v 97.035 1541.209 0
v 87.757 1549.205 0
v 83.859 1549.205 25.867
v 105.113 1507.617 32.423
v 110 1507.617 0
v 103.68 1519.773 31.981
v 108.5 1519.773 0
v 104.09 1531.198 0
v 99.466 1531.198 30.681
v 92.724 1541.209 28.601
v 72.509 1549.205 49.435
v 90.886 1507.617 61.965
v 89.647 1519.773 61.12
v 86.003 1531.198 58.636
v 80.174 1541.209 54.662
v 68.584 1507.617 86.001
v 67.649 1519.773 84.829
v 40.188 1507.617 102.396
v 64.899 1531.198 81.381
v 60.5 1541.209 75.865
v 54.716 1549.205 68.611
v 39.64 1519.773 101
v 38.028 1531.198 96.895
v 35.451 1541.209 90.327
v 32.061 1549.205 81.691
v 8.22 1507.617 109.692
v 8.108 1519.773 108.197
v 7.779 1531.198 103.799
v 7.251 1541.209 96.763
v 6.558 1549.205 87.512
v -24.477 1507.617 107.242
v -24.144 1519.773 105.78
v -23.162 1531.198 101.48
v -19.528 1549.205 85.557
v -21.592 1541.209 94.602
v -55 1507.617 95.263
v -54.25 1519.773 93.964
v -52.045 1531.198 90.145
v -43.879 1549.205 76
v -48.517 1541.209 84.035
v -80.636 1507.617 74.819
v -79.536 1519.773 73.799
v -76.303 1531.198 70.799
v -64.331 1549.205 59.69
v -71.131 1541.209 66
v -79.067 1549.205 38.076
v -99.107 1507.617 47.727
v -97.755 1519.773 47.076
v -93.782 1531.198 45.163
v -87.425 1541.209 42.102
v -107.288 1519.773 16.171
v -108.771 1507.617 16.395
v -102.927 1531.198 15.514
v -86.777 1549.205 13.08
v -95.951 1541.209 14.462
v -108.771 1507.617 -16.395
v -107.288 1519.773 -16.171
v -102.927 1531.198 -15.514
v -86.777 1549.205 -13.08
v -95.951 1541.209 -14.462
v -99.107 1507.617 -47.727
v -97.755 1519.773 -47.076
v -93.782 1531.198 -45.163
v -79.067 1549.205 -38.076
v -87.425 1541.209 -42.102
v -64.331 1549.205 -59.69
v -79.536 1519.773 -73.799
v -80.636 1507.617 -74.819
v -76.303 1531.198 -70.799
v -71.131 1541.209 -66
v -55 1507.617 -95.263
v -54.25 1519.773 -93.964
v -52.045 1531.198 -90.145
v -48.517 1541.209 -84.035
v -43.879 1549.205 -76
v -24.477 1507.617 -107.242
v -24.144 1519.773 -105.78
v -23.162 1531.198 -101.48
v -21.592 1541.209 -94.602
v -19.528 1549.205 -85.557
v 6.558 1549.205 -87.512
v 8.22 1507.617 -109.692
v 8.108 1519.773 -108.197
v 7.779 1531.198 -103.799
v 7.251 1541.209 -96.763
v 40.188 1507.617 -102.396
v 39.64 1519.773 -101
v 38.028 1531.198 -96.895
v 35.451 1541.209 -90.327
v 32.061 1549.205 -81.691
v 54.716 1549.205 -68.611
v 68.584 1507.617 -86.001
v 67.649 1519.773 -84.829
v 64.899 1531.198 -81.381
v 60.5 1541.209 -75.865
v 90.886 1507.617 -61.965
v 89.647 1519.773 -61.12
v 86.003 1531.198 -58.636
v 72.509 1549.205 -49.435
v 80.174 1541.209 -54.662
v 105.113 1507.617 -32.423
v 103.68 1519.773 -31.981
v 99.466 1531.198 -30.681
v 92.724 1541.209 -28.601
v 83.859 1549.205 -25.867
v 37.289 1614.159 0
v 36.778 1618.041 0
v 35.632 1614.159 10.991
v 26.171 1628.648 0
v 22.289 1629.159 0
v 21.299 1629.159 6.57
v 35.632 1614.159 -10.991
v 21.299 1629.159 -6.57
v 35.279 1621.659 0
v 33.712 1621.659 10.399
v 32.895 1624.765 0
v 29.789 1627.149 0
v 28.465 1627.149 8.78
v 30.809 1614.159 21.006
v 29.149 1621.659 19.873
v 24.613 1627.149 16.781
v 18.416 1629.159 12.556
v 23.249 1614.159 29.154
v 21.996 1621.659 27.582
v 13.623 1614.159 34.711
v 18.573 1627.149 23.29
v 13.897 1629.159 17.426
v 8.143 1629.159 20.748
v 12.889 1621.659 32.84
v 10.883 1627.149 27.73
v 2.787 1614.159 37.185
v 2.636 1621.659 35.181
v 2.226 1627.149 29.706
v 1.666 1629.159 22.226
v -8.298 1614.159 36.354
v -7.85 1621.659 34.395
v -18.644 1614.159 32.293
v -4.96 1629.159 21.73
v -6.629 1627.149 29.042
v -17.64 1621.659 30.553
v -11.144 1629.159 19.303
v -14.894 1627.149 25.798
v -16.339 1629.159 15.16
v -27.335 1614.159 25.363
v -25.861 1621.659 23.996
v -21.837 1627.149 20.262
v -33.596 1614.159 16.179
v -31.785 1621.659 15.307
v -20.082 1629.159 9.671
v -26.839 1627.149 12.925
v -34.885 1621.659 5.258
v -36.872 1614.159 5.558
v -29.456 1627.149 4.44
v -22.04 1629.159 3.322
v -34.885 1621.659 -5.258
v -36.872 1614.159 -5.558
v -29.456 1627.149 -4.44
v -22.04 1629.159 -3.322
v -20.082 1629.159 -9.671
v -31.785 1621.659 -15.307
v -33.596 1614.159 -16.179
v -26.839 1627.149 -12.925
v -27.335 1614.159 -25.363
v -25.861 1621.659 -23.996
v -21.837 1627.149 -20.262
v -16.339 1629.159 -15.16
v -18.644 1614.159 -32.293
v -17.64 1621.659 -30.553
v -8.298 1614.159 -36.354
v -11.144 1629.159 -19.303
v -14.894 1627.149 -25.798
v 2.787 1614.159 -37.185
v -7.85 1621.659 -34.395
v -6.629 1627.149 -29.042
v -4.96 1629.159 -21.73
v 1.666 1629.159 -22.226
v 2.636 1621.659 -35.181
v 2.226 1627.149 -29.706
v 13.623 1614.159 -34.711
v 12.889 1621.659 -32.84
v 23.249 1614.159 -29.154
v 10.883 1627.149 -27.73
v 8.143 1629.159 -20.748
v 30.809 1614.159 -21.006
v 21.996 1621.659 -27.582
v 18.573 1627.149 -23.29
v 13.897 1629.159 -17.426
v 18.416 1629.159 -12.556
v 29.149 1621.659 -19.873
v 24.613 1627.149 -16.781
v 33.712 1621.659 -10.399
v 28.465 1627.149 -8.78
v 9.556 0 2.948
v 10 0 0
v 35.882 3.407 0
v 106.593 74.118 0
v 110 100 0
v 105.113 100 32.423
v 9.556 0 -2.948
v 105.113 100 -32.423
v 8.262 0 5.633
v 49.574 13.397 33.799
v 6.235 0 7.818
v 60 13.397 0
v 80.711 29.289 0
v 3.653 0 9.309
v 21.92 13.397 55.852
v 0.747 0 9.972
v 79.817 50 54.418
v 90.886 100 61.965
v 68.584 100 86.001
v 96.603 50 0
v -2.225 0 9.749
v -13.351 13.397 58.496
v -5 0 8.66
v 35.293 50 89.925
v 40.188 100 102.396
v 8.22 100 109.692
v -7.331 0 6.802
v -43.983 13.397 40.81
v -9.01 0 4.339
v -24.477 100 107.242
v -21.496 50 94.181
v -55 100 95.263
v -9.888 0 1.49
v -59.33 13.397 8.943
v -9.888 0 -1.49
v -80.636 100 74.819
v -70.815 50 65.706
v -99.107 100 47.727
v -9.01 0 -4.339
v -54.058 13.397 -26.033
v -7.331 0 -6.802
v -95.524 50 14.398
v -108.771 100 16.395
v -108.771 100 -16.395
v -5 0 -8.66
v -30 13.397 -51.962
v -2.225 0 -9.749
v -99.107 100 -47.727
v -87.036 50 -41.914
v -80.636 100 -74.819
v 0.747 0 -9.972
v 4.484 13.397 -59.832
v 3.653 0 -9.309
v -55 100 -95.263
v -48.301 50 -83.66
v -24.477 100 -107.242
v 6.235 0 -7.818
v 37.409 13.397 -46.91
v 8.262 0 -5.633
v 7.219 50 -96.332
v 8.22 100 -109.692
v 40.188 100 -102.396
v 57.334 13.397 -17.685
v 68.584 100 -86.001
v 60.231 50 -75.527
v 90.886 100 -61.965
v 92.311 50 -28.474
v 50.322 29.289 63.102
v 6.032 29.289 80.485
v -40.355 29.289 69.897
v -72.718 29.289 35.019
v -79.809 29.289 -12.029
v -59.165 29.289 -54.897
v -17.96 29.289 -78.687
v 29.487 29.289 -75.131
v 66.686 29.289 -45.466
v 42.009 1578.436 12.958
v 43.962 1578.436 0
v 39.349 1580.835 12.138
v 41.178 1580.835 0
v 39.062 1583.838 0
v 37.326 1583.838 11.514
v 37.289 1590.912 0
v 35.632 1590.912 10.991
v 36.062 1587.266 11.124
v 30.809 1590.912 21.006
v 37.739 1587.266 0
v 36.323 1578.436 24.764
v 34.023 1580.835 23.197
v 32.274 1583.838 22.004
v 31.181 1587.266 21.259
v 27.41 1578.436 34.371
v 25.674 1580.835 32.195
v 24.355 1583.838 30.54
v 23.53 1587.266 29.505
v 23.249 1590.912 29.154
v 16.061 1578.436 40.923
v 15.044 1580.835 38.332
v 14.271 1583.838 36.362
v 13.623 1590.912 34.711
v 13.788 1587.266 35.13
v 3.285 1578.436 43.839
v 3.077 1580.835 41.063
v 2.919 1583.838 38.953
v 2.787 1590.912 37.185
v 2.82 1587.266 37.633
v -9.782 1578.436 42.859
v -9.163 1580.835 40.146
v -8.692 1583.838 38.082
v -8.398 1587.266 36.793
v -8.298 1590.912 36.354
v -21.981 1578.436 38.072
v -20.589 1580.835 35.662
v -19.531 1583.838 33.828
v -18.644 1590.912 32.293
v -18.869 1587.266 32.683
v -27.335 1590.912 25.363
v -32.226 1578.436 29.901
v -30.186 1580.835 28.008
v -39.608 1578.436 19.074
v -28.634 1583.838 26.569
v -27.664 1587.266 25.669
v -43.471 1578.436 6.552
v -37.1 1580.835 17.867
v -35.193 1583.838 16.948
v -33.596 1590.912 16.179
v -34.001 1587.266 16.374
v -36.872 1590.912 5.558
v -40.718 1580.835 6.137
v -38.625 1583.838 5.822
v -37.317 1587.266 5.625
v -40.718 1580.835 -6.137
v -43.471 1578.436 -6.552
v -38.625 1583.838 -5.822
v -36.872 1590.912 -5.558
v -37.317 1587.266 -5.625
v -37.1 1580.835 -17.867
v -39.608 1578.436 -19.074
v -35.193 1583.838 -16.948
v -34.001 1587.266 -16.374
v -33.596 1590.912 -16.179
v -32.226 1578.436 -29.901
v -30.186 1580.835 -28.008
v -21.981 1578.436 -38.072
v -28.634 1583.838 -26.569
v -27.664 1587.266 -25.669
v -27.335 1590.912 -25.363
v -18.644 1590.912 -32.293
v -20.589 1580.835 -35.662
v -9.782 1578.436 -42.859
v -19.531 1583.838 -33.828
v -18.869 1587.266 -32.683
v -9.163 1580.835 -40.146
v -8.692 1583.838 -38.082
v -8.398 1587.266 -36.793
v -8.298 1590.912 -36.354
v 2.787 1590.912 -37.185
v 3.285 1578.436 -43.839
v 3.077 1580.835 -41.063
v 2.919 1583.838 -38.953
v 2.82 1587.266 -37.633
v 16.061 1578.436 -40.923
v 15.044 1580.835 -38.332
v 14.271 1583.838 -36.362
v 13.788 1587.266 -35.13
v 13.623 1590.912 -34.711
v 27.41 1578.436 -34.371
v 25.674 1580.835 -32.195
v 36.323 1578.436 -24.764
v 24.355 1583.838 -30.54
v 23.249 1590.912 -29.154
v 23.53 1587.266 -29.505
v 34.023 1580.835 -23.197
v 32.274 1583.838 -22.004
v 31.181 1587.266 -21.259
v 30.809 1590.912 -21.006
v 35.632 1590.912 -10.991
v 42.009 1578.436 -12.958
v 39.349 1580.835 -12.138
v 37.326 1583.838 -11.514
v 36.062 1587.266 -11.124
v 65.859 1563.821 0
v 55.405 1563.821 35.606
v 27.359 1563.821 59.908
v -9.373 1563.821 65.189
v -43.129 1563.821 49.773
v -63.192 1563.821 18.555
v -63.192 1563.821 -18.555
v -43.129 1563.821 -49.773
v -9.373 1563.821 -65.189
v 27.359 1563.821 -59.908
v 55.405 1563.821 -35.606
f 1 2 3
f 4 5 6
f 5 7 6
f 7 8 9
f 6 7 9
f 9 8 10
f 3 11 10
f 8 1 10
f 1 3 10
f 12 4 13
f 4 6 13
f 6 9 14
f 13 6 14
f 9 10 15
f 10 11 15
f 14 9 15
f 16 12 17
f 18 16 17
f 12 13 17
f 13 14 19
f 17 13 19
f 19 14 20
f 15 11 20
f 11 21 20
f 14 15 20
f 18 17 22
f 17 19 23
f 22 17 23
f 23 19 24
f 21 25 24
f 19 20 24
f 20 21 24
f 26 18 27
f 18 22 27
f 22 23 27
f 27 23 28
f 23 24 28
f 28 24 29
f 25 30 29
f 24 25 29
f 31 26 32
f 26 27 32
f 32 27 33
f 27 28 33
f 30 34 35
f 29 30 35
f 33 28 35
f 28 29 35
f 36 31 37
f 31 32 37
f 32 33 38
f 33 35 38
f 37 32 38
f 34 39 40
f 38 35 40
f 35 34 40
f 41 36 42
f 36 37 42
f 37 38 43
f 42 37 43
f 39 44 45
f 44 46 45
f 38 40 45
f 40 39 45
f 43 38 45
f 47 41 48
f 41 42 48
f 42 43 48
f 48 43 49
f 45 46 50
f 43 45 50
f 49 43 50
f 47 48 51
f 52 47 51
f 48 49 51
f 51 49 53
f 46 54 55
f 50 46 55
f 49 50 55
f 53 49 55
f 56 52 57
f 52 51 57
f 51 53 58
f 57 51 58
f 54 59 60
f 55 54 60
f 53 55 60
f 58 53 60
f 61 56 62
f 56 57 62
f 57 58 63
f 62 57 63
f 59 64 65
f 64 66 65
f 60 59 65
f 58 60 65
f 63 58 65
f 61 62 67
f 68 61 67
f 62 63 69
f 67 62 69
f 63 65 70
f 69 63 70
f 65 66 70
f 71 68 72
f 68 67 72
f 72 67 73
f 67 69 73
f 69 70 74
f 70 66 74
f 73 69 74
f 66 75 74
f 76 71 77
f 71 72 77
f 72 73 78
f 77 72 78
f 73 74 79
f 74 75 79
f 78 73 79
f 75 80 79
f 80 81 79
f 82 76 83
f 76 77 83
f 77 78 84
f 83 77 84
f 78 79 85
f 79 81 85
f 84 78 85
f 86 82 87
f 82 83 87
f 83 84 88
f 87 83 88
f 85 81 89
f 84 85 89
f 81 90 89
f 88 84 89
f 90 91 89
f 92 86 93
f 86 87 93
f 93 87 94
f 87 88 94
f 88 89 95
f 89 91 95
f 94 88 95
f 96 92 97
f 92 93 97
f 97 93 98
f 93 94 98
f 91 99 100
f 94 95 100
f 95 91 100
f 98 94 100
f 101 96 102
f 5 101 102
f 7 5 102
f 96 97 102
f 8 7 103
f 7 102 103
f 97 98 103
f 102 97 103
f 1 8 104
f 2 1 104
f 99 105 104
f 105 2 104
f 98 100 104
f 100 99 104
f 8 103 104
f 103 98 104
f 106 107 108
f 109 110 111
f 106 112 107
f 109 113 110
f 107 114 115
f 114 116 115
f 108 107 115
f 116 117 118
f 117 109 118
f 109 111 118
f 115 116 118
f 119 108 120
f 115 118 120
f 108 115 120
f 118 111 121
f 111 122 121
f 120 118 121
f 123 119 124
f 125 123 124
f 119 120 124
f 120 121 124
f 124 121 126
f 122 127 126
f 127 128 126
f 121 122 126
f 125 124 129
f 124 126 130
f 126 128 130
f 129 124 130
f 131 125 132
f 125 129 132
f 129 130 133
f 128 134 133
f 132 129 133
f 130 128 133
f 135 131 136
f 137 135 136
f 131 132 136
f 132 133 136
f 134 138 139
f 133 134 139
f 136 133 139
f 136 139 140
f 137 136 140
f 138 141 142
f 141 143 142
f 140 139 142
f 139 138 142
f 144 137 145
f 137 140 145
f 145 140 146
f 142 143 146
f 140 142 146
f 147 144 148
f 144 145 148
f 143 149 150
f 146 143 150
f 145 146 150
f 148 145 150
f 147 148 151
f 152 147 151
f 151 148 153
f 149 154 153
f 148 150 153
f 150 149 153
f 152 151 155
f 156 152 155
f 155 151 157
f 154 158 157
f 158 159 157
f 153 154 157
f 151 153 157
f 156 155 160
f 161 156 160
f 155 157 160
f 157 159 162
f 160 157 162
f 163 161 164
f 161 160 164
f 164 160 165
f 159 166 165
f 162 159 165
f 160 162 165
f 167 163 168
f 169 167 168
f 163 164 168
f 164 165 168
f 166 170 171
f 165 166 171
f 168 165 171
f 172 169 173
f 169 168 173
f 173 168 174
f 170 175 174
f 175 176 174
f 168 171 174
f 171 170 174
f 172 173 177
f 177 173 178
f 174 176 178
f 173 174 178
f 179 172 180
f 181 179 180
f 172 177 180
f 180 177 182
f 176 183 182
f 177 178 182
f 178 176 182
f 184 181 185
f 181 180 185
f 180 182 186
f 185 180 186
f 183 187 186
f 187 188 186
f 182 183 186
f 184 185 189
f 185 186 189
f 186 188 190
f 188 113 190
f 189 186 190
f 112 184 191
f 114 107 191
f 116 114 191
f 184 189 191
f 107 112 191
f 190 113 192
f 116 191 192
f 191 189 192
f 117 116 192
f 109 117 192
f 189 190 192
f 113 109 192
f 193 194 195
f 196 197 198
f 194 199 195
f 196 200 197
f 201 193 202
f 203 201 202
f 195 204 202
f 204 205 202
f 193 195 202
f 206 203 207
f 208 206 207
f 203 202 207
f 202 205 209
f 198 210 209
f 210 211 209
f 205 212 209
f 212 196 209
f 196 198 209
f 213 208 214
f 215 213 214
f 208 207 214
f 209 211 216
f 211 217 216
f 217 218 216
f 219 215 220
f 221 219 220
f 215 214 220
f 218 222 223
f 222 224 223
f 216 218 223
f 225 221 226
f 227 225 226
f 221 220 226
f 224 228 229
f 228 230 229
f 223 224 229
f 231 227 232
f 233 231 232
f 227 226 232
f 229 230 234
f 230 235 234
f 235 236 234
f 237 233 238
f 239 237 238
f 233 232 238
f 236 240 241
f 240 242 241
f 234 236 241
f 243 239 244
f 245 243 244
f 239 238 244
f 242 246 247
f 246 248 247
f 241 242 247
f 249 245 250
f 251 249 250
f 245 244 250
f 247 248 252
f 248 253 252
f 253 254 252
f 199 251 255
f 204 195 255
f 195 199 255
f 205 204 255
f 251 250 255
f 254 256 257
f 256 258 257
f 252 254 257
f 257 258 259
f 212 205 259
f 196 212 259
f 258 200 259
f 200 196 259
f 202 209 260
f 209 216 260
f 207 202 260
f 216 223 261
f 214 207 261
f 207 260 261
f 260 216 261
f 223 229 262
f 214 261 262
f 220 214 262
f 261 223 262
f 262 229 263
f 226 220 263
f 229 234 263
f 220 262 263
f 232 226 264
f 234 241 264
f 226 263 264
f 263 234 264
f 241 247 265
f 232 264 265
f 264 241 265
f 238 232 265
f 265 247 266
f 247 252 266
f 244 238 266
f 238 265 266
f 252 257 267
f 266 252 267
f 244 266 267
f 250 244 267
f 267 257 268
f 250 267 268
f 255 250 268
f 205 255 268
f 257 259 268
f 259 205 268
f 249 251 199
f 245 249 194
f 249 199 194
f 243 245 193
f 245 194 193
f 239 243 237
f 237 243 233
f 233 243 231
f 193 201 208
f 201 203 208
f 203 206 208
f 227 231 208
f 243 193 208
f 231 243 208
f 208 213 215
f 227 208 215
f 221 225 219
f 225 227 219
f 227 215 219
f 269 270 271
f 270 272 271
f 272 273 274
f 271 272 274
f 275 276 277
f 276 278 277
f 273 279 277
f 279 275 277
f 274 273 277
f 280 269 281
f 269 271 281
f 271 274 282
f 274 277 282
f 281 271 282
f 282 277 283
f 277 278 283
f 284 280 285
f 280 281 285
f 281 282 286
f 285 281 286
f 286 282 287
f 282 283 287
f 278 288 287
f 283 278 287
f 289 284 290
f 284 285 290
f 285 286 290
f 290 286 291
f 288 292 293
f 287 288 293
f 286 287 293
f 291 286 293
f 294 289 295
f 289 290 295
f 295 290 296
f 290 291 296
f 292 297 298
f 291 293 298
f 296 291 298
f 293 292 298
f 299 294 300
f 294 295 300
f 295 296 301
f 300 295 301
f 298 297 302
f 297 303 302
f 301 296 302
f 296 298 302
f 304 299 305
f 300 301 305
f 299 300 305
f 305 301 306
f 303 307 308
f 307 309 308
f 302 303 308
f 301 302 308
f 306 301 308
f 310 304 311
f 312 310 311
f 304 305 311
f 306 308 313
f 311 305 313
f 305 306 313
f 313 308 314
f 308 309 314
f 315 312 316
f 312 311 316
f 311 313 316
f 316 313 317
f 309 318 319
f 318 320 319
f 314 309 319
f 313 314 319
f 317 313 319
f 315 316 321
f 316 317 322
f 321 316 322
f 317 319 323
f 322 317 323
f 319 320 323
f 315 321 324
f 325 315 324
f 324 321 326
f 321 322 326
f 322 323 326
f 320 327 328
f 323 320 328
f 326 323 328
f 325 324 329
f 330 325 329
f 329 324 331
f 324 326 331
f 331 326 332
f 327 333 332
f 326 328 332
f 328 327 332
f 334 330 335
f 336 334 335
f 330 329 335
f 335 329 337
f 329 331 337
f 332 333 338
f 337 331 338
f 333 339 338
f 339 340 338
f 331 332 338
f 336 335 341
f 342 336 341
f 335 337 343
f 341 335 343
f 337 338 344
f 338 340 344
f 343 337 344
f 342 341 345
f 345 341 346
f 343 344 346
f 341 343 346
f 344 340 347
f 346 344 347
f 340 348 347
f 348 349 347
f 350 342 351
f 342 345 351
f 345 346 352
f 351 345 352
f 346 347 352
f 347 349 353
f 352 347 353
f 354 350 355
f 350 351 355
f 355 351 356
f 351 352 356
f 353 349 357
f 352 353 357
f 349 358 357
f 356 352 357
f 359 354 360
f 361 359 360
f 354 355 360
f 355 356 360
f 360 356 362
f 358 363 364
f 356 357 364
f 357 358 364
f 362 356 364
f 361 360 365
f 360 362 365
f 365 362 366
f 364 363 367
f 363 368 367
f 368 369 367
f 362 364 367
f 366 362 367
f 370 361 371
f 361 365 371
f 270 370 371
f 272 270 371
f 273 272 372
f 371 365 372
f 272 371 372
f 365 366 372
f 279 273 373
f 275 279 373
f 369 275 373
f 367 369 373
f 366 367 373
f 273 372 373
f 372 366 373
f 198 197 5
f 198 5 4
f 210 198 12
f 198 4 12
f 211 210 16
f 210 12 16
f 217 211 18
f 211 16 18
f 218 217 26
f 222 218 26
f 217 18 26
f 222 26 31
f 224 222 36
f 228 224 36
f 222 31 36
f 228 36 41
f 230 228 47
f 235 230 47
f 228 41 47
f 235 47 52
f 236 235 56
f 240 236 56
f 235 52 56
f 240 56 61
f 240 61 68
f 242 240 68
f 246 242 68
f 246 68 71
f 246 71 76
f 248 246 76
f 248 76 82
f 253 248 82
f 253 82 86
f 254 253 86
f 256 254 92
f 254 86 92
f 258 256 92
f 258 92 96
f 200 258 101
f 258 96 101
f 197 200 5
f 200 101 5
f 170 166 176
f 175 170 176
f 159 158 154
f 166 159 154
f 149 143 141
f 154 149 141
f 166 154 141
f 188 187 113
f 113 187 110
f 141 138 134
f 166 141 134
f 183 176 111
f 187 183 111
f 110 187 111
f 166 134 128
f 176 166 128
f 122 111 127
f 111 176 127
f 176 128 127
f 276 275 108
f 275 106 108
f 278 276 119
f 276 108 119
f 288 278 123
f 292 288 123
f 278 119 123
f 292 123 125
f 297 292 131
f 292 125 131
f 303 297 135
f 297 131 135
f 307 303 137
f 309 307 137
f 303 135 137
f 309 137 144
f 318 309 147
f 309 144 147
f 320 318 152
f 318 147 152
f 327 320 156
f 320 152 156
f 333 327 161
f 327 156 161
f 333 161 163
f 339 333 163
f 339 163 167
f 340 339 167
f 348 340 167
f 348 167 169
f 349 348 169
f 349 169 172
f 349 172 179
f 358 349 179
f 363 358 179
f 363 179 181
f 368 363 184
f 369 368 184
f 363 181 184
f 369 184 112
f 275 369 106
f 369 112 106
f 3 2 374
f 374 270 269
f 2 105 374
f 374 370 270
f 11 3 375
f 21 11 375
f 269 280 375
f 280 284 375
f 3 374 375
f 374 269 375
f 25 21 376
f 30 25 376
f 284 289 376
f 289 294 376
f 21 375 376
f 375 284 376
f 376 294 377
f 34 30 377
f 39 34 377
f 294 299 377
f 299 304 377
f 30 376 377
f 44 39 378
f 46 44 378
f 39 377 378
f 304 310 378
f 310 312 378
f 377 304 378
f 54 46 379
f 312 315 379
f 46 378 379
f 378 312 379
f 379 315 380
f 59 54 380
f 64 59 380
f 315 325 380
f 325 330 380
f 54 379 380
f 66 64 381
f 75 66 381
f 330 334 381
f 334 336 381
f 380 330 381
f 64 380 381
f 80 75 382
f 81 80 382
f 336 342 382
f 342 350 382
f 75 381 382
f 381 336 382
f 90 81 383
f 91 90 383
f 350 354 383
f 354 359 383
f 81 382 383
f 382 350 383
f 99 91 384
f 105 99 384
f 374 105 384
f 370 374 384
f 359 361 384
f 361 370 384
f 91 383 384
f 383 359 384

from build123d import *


with BuildPart() as part:
    # Эскиз1 → Повернуть1 (revolve)
    with BuildSketch(Plane.XY):
        with BuildLine():
            Line((0, 0), (10, 0))
            ThreePointArc((10, 0), (80.710678119, 29.289321881), (110, 100))
            Line((110, 100), (110, 1507.617384372))
            ThreePointArc((110, 1507.617384372), (104.090062317, 1531.198444671), (87.757343806, 1549.205001097))
            Line((87.757343806, 1549.205001097), (43.961595612, 1578.436145741))
            ThreePointArc((43.961595612, 1578.436145741), (39.061780059, 1583.838112668), (37.288798754, 1590.912430758))
            Line((37.288798754, 1590.912430758), (37.288798754, 1614.158761672))
            ThreePointArc((37.288798754, 1614.158761672), (32.895400472, 1624.76536339), (22.288798754, 1629.158761672))
            Line((22.288798754, 1629.158761672), (0, 1629.158761672))
            Line((0, 1629.158761672), (0, 0))
        make_face()
    revolve(axis=Axis((0, 1553.075867376, 0), (0, -1, 0)))


solid = part.part
